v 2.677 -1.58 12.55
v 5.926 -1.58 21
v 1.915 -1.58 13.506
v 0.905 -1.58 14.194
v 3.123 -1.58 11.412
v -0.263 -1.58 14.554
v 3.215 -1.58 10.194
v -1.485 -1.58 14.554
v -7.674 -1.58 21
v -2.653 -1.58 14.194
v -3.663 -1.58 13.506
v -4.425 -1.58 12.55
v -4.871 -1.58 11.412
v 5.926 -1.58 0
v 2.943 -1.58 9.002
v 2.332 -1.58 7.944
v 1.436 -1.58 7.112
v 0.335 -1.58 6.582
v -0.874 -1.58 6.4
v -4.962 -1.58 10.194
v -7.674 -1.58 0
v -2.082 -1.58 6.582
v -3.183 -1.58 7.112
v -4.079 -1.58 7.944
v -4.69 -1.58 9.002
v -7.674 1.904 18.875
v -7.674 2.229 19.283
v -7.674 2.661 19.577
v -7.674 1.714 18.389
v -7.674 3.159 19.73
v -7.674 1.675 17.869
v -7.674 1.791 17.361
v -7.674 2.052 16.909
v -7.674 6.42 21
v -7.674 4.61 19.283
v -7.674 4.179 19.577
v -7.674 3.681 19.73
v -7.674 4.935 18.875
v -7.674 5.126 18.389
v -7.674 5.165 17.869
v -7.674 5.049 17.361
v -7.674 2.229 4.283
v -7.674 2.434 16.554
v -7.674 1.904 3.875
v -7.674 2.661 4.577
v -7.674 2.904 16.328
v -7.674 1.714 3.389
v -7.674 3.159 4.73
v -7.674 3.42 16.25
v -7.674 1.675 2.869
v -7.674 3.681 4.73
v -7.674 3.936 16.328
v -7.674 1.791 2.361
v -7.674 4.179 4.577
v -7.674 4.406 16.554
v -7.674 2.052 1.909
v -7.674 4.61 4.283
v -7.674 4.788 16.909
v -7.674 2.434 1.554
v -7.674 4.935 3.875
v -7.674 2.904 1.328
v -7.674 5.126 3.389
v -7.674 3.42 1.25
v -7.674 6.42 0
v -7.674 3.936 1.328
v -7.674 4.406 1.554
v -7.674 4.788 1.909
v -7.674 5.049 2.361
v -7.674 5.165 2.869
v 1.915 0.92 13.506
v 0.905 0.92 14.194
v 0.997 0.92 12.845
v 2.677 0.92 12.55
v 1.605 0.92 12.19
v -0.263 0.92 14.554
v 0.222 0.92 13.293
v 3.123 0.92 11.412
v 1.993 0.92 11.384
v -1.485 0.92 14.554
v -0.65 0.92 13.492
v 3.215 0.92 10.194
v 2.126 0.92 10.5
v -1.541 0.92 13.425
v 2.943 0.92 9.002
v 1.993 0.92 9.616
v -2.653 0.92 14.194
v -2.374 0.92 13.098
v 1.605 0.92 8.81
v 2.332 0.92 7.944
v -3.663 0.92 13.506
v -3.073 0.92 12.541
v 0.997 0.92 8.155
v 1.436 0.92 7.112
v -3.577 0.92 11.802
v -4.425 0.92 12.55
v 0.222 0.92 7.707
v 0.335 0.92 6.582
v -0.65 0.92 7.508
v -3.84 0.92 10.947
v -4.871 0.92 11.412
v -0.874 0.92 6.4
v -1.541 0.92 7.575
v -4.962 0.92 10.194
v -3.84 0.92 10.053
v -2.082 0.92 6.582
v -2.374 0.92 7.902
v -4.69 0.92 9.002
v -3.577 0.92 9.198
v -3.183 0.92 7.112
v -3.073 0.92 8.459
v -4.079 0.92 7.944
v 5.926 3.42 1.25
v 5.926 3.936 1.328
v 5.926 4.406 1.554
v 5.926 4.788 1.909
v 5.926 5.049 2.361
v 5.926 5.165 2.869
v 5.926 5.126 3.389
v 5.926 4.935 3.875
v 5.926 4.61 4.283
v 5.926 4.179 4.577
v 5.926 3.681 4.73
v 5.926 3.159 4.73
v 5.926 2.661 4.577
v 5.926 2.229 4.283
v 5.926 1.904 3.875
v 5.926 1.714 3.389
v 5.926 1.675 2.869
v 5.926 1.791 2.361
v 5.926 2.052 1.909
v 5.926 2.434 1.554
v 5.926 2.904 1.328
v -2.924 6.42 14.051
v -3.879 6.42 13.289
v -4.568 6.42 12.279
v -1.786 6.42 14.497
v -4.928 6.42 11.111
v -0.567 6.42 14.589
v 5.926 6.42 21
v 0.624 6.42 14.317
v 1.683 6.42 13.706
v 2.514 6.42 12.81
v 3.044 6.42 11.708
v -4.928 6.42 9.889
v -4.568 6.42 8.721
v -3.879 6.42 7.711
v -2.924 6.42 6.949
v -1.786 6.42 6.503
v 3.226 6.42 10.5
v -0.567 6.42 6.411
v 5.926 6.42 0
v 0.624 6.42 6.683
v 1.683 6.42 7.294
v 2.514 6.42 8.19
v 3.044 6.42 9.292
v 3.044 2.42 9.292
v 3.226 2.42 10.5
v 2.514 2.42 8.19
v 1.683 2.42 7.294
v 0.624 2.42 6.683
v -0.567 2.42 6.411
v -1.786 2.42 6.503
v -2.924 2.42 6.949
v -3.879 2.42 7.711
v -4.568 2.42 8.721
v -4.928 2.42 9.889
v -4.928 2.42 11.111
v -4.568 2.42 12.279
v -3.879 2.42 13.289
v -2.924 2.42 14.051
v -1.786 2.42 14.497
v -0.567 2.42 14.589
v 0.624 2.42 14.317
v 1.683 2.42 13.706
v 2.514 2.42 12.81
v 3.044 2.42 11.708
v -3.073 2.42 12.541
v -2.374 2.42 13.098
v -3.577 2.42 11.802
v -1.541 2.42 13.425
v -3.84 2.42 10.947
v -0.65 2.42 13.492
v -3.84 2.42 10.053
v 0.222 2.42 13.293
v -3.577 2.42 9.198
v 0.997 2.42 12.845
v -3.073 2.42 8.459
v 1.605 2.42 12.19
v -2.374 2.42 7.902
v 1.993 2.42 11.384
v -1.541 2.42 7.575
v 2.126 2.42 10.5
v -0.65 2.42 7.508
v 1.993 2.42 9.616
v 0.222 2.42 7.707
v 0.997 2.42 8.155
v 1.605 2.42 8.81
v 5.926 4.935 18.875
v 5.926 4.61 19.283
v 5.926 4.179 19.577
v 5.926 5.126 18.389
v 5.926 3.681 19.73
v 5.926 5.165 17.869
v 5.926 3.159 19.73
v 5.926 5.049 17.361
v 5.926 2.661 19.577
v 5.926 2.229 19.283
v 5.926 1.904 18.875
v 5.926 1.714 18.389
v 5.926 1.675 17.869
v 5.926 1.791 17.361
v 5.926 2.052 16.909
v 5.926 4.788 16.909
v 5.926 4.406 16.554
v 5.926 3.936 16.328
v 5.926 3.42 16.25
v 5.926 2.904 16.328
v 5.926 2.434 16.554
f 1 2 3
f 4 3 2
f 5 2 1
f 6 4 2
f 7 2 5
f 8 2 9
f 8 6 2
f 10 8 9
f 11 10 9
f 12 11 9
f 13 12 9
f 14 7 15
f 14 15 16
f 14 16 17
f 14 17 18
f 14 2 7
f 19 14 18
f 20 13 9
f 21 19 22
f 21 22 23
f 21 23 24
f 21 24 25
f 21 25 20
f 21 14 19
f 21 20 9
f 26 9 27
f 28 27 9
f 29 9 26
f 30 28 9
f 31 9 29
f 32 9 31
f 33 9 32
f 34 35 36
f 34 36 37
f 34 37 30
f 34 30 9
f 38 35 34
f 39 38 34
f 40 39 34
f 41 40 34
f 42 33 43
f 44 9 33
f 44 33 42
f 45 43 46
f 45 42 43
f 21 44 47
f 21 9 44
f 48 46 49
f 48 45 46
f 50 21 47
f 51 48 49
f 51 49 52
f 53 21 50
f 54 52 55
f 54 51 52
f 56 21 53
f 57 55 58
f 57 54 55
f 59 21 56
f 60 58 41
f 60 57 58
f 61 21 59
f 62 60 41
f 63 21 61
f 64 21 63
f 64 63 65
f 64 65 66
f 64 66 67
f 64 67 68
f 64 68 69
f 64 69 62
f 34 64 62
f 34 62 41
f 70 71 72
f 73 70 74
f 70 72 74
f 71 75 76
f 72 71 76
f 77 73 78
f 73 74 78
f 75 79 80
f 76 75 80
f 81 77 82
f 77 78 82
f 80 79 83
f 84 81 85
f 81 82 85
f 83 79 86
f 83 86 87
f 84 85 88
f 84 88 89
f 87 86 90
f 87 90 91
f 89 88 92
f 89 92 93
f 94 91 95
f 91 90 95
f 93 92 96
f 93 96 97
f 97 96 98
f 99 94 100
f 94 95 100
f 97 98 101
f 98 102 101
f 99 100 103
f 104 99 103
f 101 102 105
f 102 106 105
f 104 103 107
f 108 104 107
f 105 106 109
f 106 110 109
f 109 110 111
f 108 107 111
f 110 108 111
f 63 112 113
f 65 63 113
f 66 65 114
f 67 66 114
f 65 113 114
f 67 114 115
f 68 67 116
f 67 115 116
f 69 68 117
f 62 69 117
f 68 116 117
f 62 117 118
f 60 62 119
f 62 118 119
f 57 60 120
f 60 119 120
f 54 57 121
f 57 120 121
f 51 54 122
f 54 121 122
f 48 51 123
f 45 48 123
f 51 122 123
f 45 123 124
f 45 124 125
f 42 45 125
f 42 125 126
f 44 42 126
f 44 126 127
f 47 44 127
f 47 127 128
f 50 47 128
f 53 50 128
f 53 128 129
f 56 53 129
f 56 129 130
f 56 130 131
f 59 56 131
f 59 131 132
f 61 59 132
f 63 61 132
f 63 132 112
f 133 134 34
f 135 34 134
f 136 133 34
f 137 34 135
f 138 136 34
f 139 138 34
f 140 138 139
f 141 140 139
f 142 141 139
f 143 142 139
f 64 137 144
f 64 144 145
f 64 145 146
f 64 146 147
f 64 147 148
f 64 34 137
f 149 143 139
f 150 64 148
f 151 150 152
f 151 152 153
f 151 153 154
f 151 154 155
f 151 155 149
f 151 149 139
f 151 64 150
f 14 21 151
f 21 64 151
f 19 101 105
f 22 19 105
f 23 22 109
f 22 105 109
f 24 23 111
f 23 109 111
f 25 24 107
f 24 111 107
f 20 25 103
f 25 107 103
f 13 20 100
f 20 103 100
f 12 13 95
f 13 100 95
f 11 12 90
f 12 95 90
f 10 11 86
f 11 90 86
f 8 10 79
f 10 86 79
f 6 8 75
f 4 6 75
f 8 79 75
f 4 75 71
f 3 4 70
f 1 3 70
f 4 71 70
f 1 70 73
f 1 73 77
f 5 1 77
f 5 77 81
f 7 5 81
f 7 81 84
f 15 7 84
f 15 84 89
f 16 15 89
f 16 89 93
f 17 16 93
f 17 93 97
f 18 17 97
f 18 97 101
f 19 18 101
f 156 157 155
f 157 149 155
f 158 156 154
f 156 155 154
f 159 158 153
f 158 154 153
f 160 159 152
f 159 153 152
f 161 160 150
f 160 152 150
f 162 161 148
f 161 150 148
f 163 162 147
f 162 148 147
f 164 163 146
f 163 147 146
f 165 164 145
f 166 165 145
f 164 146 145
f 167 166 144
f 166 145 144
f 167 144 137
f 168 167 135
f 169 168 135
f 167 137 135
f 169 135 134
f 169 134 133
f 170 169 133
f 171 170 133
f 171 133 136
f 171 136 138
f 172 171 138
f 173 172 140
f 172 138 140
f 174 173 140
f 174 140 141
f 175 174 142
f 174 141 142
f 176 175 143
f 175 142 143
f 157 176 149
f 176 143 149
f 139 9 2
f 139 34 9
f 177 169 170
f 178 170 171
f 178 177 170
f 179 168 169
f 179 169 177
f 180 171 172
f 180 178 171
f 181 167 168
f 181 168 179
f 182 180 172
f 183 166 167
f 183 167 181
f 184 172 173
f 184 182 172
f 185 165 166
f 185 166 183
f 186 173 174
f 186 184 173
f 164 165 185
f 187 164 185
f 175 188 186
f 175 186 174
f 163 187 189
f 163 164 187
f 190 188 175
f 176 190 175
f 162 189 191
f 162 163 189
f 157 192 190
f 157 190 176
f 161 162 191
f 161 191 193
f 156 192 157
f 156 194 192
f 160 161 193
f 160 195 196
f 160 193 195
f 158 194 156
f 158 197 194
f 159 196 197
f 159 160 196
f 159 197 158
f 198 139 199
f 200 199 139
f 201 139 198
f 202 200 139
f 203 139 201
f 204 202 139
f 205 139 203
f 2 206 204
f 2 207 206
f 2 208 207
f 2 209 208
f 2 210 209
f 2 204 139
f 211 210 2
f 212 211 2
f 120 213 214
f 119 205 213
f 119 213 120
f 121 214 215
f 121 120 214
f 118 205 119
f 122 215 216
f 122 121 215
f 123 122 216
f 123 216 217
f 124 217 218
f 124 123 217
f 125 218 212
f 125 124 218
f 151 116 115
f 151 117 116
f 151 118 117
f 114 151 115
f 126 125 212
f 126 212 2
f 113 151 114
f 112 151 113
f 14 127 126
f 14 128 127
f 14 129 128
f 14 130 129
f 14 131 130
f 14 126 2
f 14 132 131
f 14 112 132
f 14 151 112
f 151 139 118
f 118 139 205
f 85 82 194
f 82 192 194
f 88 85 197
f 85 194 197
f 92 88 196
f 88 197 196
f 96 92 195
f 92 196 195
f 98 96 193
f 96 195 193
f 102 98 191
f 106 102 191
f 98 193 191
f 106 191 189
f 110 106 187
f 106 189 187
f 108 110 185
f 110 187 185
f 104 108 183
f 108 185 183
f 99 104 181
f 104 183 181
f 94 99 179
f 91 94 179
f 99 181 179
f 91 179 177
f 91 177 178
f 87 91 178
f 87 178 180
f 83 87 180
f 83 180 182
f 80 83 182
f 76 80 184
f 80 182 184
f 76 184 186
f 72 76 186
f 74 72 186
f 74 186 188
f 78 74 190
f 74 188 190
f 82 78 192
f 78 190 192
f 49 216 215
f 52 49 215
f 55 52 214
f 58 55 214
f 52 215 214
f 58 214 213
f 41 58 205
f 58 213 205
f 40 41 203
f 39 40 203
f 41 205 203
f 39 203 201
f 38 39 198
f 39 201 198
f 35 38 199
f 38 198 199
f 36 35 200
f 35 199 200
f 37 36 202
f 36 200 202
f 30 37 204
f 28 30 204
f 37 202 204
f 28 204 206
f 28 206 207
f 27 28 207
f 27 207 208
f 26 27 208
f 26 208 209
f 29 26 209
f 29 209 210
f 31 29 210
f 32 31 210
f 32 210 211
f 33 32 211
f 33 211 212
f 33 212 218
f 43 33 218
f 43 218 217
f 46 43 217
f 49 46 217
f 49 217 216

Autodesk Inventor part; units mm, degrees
ref_plane "YZ Plane" through (0, 0, 0) normal (1, 0, 0) x (0, 1, 0)
ref_plane "XZ Plane" through (0, 0, 0) normal (0, 1, 0) x (-1, 0, 0)
ref_plane "XY Plane" through (0, 0, 0) normal (0, 0, 1) x (1, 0, 0)
sketch "Sketch1" plane through (0, 0, 0) normal (0, 0, 1) x (1, 0, 0)
  line L0 (-7.6738, 6.4198) -> (5.9262, 6.4198)
  line L1 (5.9262, 6.4198) -> (5.9262, -1.5802)
  line L2 (5.9262, -1.5802) -> (-7.6738, -1.5802)
  line L3 (-7.6738, -1.5802) -> (-7.6738, 6.4198)
  point P0 (0, 0)
  dimension "d0" = 8
  dimension "d1" = 13.6
extrude "Extrusion1" add sketch "Sketch1" along normal blind 21
sketch "Sketch2" plane through (5.9262, -1.5802, 0) normal (1, 0, 0) x (0, 0, -1)
  line L0 (-10.5, 7.1029) -> (-10.5, -3.9254)
  line L1 (-18.4841, 5) -> (1.1812, 5) construction
  circle A0 centre (-18, 5) radius 1.75
  circle A1 centre (-3, 5) radius 1.75
  line L2 (0, 8) -> (0, 0) construction
  line L3 (0, 8) -> (-21, 8) construction
  line L4 (-21, 0) -> (-21, 8) construction
  line L5 (0, 0) -> (-21, 0) construction
  line L6 (0, 8) -> (-21, 8) construction
  line L7 (-10.5, 8) -> (-10.5, 9.8874) construction
  point P0 (0, 1.5802)
  dimension "d4" = 3.5
  dimension "d6" = 15
  dimension "d24" = 3
extrude "Extrusion2" cut sketch "Sketch2" against normal through all
sketch "Sketch3" plane through (-7.6738, 6.4198, 0) normal (0, 1, 0) x (1, 0, 0)
  line L0 (13.6, -21) -> (0, -21) projected
  line L1 (6.8, -21) -> (6.8, 5.3018)
  line L2 (0, 0) -> (0, -21) projected
  line L3 (0, -10.5) -> (13.6, -10.5)
  line L4 (13.6, 0) -> (13.6, -21) projected
  circle A0 centre (6.8, -10.5) radius 3
  circle A1 centre (6.8, -10.5) radius 4.1
  point P0 (7.6738, 0)
  dimension "d9" = 6
  dimension "d10" = 8.2
extrude "bearing depth 2mm" cut sketch "Sketch3" against normal blind 4 contours A1 L3 A0 L1 | L1 A0 L3 A1 | L3 A0 L1 A1 | A1 L1 A0 L3
extrude "Extrusion4" cut sketch "Sketch3" against normal up to surface (8 mm away) contours A0 L3 L1 | L1 L3 A0 | L3 L1 A0 | L3 A0 L1
hole "Hole2" at (-0.8738, -1.5802, 10.5) direction (0, 1, 0) diameter 4 end through all counterbore diameter 8.2 counterbore depth 2.5
properties part number "slider-top-anker"
